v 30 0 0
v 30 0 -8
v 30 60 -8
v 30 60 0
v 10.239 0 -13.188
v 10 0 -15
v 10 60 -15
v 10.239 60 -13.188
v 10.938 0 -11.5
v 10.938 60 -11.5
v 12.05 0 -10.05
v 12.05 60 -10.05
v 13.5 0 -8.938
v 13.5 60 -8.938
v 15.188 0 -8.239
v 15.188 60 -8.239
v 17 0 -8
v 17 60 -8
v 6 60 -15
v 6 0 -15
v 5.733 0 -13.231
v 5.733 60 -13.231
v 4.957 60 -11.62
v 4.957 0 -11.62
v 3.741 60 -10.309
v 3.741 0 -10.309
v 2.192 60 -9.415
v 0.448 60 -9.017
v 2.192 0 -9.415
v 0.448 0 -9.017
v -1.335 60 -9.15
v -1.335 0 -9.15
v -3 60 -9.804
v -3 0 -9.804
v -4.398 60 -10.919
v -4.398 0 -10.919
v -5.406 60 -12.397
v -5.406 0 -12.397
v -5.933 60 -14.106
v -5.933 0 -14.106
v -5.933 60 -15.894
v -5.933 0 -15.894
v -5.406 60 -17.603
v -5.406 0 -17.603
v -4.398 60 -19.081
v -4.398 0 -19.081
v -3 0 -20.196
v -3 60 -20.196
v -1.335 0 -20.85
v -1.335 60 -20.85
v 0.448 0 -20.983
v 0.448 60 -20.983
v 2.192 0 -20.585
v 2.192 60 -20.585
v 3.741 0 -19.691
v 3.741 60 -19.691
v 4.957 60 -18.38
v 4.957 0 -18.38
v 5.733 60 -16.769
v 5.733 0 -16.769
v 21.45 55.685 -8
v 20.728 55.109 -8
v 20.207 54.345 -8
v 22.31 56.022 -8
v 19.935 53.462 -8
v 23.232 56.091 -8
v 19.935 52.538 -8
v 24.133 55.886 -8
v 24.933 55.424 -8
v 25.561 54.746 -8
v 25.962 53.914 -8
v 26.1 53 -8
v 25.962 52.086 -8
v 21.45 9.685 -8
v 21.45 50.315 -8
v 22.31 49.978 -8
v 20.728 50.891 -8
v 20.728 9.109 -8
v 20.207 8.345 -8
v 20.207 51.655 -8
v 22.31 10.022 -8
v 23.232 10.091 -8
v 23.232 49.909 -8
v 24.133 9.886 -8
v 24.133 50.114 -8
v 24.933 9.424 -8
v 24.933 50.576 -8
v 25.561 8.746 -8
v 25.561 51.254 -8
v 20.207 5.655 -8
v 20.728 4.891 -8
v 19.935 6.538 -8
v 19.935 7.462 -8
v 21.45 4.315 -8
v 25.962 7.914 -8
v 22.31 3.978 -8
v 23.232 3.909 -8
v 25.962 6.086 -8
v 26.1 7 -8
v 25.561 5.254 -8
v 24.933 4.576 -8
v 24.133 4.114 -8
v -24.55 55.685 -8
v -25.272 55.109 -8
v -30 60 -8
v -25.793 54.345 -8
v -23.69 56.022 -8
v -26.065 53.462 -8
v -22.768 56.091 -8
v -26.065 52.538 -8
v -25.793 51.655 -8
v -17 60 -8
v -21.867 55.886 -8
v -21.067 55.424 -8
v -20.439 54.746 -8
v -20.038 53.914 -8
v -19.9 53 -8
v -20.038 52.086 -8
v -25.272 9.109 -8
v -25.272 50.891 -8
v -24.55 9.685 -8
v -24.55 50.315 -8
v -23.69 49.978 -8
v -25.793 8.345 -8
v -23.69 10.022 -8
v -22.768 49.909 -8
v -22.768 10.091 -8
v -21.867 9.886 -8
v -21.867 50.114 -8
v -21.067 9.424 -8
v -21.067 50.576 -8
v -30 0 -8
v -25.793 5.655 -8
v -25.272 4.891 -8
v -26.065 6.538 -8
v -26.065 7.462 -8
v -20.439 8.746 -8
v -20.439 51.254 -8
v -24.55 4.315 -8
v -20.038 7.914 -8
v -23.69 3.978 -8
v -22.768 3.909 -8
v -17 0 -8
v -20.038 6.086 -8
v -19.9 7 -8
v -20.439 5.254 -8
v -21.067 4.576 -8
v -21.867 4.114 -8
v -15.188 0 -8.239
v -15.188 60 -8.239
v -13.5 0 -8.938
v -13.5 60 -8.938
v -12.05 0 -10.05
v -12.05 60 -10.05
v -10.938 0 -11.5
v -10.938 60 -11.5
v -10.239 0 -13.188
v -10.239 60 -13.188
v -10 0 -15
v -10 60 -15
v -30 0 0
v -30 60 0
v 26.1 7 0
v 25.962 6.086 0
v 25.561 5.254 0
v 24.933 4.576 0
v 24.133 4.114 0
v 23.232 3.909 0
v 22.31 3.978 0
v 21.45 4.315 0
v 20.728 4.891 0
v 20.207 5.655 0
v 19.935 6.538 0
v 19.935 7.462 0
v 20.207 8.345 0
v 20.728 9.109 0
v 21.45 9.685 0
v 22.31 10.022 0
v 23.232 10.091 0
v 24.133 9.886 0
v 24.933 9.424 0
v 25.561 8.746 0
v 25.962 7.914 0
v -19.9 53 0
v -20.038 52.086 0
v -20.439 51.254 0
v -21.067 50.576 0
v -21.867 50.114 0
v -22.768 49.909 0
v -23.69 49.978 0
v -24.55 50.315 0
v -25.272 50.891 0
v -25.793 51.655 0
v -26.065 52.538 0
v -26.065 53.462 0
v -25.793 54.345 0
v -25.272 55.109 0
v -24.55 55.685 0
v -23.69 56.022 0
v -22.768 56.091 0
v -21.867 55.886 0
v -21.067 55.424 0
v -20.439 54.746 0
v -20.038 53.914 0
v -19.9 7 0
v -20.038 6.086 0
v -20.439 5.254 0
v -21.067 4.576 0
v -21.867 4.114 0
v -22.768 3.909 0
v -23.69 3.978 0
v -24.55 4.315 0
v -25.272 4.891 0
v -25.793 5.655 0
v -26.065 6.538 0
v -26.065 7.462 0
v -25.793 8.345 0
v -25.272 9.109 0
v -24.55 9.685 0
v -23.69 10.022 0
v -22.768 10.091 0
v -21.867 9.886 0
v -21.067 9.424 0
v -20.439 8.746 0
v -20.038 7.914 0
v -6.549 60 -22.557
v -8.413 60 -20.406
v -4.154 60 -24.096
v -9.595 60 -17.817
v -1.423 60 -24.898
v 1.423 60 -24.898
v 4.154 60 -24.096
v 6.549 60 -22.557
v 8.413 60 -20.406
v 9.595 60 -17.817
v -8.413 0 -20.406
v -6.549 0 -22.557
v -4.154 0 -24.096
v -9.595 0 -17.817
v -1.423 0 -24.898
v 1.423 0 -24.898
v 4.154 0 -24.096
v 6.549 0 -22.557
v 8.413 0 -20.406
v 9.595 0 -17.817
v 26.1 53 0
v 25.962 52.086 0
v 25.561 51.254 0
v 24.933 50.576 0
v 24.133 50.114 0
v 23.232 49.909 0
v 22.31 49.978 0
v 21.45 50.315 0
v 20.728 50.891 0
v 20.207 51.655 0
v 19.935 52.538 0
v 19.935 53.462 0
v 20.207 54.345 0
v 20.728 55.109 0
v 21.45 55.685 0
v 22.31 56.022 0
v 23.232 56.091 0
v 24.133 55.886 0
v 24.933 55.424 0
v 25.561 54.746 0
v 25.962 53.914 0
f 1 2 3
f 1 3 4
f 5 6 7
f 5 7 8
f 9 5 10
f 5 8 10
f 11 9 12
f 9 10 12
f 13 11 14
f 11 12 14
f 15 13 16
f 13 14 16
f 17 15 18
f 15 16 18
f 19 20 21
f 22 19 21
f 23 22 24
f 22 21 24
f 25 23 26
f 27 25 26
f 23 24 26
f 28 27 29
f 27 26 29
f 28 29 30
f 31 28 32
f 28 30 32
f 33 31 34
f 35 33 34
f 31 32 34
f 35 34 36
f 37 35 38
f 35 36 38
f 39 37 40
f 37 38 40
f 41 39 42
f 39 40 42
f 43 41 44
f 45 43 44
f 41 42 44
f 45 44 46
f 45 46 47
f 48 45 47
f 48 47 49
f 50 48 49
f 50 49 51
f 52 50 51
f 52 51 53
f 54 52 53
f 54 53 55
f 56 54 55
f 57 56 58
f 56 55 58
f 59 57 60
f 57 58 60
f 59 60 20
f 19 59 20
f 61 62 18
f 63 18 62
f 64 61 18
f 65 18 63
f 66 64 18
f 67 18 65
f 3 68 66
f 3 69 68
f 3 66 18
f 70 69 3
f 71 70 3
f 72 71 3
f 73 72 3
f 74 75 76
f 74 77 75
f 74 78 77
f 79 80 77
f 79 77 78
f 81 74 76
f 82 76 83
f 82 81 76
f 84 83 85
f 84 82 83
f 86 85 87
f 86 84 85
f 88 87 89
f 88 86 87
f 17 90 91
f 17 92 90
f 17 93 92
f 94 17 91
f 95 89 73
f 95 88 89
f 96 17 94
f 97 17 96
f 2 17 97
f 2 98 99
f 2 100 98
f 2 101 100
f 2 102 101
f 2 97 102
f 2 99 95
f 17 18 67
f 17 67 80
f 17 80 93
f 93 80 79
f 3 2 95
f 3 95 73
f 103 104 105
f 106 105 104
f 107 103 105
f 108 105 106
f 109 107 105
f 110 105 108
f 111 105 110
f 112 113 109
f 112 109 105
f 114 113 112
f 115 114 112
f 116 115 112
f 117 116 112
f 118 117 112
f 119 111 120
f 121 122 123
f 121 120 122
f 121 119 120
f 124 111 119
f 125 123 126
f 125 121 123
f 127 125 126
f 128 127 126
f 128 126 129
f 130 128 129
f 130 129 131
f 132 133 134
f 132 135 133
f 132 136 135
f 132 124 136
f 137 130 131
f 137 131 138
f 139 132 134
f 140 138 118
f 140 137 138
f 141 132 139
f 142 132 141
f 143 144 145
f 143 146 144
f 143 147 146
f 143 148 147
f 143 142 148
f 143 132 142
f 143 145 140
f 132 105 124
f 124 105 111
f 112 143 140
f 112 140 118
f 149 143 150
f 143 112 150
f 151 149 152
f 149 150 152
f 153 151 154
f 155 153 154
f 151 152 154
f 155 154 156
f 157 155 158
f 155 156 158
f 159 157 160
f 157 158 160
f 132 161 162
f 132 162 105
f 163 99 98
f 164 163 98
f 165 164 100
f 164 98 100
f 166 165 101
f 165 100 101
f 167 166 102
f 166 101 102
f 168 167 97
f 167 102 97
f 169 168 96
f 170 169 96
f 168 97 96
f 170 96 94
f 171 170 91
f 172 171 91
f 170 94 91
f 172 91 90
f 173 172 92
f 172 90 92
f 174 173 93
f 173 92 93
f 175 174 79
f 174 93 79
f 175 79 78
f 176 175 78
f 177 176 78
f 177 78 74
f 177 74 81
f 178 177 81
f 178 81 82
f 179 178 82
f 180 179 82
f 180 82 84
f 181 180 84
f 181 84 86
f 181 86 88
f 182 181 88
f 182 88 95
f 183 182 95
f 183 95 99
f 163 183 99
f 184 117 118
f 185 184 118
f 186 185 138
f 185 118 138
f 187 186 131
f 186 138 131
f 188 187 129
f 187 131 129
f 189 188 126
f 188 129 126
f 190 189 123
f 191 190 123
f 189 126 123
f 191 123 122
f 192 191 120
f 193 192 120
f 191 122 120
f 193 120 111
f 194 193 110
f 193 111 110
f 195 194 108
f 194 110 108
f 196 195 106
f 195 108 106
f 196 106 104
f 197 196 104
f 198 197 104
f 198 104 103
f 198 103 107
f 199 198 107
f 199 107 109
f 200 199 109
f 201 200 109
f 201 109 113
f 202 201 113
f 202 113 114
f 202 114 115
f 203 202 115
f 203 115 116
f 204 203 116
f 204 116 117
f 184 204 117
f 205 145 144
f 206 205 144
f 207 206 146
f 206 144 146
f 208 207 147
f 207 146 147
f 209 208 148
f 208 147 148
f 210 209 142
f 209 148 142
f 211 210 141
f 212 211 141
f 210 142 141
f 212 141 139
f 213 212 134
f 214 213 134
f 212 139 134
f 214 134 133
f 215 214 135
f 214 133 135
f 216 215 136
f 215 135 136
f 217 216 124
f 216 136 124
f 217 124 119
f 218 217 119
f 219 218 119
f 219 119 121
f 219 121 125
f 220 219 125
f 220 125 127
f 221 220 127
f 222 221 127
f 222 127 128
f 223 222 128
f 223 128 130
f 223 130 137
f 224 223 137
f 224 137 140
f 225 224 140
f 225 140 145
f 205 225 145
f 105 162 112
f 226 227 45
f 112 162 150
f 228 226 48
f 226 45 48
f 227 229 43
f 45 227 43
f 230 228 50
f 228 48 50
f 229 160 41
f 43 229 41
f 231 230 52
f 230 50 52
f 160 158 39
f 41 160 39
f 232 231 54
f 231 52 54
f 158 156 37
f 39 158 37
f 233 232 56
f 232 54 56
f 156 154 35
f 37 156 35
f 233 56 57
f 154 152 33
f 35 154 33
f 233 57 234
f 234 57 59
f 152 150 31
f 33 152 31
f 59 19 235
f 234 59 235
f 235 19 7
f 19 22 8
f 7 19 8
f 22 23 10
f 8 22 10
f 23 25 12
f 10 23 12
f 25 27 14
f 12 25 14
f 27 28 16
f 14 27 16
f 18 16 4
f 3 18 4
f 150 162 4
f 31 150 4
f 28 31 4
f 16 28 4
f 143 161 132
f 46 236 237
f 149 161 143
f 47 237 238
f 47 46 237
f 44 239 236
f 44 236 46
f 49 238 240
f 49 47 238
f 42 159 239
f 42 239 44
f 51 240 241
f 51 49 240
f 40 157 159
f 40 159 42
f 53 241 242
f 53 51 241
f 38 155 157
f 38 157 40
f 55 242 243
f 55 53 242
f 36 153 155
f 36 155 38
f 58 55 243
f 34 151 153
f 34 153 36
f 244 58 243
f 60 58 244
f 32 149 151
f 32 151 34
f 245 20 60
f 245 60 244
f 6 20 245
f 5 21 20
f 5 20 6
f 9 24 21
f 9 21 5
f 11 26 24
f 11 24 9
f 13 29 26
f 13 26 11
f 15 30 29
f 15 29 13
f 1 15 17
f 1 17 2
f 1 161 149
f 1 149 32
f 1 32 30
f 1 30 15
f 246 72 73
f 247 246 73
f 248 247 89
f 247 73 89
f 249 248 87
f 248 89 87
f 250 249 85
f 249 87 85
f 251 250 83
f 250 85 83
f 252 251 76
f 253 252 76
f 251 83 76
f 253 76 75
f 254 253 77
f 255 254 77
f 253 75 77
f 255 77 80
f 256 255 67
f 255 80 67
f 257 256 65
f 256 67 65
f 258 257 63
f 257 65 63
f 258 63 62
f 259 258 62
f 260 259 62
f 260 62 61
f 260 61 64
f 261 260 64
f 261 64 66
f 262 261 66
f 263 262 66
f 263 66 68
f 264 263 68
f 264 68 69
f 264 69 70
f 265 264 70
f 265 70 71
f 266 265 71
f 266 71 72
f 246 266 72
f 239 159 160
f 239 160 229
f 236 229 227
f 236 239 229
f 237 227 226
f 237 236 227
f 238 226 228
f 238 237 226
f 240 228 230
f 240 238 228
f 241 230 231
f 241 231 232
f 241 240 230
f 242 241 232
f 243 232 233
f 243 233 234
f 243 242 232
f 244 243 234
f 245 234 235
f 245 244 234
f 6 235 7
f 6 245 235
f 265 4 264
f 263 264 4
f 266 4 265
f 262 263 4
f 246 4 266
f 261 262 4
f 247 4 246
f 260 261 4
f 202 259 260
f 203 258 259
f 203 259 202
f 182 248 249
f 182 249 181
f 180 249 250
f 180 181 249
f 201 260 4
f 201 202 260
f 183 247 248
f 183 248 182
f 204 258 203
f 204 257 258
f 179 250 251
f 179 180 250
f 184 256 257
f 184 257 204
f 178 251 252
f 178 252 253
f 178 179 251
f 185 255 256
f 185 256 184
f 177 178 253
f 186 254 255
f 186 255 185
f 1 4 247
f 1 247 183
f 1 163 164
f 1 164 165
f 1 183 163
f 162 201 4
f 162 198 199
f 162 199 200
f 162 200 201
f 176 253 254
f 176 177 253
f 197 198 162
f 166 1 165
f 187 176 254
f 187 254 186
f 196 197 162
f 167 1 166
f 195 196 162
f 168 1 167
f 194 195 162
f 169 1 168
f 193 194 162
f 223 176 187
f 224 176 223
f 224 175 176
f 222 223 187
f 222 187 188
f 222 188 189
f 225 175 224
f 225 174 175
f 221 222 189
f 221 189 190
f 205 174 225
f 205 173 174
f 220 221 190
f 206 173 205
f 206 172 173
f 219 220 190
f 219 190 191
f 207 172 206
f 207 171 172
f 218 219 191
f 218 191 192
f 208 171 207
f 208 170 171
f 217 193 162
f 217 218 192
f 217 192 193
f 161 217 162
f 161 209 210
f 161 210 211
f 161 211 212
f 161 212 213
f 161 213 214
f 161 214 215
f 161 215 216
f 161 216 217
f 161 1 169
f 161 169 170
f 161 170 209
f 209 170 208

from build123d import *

# Parameters (mm, degrees)
F0_R     = 6
F1_DEPTH = 60
F2_R     = 7
F3_R     = 3.1
F4_DEPTH = 8.001


with BuildPart() as f1:
    # F0 (on Front) → F1 (new body)
    with BuildSketch(Plane.XZ):
        with BuildLine():
            Line((-30, -8), (-7.141428, -8))
            ThreePointArc((-7.141428, -8), (0, -25), (7.141428, -8))
            Line((7.141428, -8), (30, -8))
            Line((30, -8), (30, 0))
            Line((30, 0), (-30, 0))
            Line((-30, 0), (-30, -8))
        make_face()
        with Locations((0, -15)):
            Circle(F0_R, mode=Mode.SUBTRACT)
    extrude(amount=-F1_DEPTH)

    # F2
    f2_edges = [f1.edges().sort_by_distance(p)[0] for p in [
        (7.141428, 30, -8),
        (-7.141428, 30, -8),
    ]]
    fillet(f2_edges, radius=F2_R)

    # F3 (on face) → F4 (cut, through all)
    with BuildSketch(Plane(origin=(0, 0, -8), x_dir=(1, 0, 0), z_dir=(0, 0, -1))):
        with Locations((-23, -7)):
            Circle(F3_R)
        with Locations((-23, -53)):
            Circle(F3_R)
        with Locations((23, -7)):
            Circle(F3_R)
        with Locations((23, -53)):
            Circle(F3_R)
    extrude(amount=-F4_DEPTH, mode=Mode.SUBTRACT)


solid = f1.part
